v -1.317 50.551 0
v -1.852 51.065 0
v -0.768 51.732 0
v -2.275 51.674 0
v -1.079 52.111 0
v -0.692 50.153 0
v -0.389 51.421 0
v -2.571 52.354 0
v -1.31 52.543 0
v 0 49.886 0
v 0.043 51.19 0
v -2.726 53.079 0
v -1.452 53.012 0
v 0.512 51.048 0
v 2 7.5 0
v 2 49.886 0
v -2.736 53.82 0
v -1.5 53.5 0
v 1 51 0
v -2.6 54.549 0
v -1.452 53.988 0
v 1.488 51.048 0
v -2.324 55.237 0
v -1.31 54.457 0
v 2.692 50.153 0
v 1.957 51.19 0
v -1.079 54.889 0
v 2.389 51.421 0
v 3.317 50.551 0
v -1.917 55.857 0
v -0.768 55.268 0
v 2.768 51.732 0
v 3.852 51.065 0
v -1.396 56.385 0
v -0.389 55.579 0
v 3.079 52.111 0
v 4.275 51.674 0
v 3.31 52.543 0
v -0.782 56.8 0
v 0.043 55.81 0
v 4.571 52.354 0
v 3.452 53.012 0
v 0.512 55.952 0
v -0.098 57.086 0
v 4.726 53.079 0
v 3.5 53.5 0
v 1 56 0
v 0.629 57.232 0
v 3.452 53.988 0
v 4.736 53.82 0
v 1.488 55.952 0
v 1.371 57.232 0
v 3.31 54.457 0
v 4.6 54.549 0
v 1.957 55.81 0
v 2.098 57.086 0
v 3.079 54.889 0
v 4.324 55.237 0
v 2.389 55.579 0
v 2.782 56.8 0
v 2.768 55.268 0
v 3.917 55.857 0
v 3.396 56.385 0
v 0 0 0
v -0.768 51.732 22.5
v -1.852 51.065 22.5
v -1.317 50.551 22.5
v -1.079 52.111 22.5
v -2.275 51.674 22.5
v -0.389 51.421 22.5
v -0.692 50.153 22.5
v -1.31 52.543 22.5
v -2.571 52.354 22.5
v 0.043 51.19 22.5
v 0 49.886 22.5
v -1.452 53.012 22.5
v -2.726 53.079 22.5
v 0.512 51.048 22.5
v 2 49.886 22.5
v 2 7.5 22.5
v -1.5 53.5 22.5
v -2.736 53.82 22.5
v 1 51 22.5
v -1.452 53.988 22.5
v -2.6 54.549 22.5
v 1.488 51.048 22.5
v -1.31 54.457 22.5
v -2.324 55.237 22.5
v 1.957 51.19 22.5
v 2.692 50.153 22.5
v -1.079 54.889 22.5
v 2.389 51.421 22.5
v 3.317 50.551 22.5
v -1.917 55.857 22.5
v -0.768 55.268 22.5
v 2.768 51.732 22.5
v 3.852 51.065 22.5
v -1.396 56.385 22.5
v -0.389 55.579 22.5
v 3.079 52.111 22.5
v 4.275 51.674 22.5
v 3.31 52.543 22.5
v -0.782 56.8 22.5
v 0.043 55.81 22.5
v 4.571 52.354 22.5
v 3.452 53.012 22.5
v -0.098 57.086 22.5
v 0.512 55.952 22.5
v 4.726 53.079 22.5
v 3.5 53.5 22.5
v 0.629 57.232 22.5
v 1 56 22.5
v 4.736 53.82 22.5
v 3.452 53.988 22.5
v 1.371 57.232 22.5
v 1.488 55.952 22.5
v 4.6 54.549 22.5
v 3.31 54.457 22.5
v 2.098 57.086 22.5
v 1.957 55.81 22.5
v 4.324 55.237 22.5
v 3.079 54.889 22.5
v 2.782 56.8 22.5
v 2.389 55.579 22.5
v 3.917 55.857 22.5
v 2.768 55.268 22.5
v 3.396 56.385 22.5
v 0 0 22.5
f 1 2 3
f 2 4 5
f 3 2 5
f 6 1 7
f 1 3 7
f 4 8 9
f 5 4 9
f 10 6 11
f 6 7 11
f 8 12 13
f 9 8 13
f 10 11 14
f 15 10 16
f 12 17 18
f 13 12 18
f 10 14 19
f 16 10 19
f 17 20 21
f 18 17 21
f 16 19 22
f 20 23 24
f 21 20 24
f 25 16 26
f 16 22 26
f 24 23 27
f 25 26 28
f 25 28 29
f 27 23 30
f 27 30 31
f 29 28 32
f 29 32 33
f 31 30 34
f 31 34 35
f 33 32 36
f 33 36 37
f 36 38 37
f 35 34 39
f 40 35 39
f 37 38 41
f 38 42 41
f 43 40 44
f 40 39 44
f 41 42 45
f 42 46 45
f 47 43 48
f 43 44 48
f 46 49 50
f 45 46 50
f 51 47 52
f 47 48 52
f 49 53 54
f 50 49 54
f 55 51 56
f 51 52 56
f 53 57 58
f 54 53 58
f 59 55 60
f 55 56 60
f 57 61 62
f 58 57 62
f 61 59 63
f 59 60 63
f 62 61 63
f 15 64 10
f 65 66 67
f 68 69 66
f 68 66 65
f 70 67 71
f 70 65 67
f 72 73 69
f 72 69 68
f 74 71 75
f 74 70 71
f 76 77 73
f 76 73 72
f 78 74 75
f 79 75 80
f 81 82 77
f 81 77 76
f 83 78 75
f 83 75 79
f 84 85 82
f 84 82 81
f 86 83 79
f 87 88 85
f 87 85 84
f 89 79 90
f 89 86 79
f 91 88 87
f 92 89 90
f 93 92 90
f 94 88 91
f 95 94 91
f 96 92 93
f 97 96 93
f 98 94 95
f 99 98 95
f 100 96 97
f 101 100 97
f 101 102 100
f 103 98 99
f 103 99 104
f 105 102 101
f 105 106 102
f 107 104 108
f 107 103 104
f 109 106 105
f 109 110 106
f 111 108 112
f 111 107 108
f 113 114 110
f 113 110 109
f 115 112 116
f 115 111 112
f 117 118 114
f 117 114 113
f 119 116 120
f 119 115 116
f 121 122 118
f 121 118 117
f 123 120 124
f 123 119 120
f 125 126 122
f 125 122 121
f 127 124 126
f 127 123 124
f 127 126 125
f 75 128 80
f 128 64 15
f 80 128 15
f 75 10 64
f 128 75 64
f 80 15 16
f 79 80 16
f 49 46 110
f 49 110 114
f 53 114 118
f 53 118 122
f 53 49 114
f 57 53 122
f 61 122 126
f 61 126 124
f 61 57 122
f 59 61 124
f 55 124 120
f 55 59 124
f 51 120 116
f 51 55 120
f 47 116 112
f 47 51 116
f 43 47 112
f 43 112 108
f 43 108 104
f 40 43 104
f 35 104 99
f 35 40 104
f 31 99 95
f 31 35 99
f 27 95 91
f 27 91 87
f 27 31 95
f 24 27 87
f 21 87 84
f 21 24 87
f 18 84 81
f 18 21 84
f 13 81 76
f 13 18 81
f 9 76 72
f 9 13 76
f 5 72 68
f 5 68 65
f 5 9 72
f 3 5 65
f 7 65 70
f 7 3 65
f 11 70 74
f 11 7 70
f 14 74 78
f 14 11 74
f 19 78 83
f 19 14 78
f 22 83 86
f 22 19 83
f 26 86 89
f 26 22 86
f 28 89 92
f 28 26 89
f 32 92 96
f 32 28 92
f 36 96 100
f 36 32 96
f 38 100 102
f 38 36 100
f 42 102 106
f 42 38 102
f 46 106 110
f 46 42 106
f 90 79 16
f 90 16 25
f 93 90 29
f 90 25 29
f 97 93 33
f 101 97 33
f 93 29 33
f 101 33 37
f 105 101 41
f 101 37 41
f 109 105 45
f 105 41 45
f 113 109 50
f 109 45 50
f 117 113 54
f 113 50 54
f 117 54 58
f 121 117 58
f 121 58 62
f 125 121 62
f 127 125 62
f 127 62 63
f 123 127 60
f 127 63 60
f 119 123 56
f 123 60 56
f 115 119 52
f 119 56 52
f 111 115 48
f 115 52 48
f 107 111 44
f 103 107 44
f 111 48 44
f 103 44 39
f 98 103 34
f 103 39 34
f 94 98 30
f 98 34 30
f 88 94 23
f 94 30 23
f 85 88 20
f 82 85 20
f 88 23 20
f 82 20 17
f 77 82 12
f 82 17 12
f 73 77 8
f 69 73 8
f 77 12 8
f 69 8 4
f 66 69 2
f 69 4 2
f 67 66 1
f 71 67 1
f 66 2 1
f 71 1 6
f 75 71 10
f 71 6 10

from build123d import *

# Parameters (mm, degrees)
CROQUIS1_R              = 3.75
CROQUIS1_R_2            = 2.5
SALIENTE_EXTRUIR1_DEPTH = 22.5


with BuildPart() as part:
    # Croquis1 → Saliente-Extruir1 (new body)
    with BuildSketch(Plane.XY):
        with Locations((1, 53.5)):
            Circle(CROQUIS1_R)
        with Locations((1, 53.5)):
            Circle(CROQUIS1_R_2, mode=Mode.SUBTRACT)
        with BuildLine():
            Line((0, 49.885791926), (0, 0))
            Line((0, 0), (2, 7.5))
            Line((2, 7.5), (2, 49.885791926))
            ThreePointArc((2, 49.885791926), (1, 49.75), (0, 49.885791926))
        make_face()
    extrude(amount=SALIENTE_EXTRUIR1_DEPTH)


solid = part.part
